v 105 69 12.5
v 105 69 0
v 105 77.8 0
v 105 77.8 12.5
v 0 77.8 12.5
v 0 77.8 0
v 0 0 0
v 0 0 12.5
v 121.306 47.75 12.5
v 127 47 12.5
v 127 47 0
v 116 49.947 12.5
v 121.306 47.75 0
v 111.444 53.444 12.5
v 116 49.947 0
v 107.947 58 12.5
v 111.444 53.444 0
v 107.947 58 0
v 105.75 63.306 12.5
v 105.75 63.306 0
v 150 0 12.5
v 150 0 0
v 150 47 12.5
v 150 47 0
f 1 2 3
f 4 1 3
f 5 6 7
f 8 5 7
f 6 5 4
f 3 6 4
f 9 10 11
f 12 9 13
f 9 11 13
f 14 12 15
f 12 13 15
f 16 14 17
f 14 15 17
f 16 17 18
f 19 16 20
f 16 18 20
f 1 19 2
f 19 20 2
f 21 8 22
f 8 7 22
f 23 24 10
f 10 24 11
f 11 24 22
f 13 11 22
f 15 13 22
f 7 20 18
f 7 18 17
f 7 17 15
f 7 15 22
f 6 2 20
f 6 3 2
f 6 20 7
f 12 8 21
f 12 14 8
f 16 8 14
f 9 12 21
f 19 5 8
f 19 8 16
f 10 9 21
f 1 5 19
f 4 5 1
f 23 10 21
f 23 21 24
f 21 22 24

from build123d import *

# Parameters (mm, degrees)
BOSS_EXTRUDE1_DEPTH = 5.5
BOSS_EXTRUDE2_DEPTH = 7
SKETCH3_W           = 105
SKETCH3_H           = 14.2
CUT_EXTRUDE1_DEPTH  = 177.40932515


with BuildPart() as part:
    # Sketch1 → Boss-Extrude1 (new body)
    with BuildSketch(Plane.XY):
        with BuildLine():
            Line((127, 47), (150, 47))
            Line((150, 47), (150, 0))
            Line((150, 0), (0, 0))
            Line((0, 0), (0, 69))
            Line((0, 69), (0, 92))
            Line((0, 92), (105, 92))
            Line((105, 92), (105, 69))
            ThreePointArc((105, 69), (111.443650814, 53.443650814), (127, 47))
        make_face()
    extrude(amount=BOSS_EXTRUDE1_DEPTH)

    # Sketch2 → Boss-Extrude2 (add)
    with BuildSketch(Plane.XY.offset(5.5)):
        with BuildLine():
            Line((0, 92), (0, 0))
            Line((0, 0), (150, 0))
            Line((150, 0), (150, 47))
            Line((150, 47), (127, 47))
            ThreePointArc((127, 47), (111.443650814, 53.443650814), (105, 69))
            Line((105, 69), (105, 92))
            Line((105, 92), (0, 92))
        make_face()
    extrude(amount=BOSS_EXTRUDE2_DEPTH)

    # Sketch3 → Cut-Extrude1 (cut, through all)
    with BuildSketch(Plane.XY.offset(12.5)):
        with Locations((52.5, 84.9)):
            Rectangle(SKETCH3_W, SKETCH3_H)
    extrude(amount=-CUT_EXTRUDE1_DEPTH, mode=Mode.SUBTRACT)


solid = part.part
